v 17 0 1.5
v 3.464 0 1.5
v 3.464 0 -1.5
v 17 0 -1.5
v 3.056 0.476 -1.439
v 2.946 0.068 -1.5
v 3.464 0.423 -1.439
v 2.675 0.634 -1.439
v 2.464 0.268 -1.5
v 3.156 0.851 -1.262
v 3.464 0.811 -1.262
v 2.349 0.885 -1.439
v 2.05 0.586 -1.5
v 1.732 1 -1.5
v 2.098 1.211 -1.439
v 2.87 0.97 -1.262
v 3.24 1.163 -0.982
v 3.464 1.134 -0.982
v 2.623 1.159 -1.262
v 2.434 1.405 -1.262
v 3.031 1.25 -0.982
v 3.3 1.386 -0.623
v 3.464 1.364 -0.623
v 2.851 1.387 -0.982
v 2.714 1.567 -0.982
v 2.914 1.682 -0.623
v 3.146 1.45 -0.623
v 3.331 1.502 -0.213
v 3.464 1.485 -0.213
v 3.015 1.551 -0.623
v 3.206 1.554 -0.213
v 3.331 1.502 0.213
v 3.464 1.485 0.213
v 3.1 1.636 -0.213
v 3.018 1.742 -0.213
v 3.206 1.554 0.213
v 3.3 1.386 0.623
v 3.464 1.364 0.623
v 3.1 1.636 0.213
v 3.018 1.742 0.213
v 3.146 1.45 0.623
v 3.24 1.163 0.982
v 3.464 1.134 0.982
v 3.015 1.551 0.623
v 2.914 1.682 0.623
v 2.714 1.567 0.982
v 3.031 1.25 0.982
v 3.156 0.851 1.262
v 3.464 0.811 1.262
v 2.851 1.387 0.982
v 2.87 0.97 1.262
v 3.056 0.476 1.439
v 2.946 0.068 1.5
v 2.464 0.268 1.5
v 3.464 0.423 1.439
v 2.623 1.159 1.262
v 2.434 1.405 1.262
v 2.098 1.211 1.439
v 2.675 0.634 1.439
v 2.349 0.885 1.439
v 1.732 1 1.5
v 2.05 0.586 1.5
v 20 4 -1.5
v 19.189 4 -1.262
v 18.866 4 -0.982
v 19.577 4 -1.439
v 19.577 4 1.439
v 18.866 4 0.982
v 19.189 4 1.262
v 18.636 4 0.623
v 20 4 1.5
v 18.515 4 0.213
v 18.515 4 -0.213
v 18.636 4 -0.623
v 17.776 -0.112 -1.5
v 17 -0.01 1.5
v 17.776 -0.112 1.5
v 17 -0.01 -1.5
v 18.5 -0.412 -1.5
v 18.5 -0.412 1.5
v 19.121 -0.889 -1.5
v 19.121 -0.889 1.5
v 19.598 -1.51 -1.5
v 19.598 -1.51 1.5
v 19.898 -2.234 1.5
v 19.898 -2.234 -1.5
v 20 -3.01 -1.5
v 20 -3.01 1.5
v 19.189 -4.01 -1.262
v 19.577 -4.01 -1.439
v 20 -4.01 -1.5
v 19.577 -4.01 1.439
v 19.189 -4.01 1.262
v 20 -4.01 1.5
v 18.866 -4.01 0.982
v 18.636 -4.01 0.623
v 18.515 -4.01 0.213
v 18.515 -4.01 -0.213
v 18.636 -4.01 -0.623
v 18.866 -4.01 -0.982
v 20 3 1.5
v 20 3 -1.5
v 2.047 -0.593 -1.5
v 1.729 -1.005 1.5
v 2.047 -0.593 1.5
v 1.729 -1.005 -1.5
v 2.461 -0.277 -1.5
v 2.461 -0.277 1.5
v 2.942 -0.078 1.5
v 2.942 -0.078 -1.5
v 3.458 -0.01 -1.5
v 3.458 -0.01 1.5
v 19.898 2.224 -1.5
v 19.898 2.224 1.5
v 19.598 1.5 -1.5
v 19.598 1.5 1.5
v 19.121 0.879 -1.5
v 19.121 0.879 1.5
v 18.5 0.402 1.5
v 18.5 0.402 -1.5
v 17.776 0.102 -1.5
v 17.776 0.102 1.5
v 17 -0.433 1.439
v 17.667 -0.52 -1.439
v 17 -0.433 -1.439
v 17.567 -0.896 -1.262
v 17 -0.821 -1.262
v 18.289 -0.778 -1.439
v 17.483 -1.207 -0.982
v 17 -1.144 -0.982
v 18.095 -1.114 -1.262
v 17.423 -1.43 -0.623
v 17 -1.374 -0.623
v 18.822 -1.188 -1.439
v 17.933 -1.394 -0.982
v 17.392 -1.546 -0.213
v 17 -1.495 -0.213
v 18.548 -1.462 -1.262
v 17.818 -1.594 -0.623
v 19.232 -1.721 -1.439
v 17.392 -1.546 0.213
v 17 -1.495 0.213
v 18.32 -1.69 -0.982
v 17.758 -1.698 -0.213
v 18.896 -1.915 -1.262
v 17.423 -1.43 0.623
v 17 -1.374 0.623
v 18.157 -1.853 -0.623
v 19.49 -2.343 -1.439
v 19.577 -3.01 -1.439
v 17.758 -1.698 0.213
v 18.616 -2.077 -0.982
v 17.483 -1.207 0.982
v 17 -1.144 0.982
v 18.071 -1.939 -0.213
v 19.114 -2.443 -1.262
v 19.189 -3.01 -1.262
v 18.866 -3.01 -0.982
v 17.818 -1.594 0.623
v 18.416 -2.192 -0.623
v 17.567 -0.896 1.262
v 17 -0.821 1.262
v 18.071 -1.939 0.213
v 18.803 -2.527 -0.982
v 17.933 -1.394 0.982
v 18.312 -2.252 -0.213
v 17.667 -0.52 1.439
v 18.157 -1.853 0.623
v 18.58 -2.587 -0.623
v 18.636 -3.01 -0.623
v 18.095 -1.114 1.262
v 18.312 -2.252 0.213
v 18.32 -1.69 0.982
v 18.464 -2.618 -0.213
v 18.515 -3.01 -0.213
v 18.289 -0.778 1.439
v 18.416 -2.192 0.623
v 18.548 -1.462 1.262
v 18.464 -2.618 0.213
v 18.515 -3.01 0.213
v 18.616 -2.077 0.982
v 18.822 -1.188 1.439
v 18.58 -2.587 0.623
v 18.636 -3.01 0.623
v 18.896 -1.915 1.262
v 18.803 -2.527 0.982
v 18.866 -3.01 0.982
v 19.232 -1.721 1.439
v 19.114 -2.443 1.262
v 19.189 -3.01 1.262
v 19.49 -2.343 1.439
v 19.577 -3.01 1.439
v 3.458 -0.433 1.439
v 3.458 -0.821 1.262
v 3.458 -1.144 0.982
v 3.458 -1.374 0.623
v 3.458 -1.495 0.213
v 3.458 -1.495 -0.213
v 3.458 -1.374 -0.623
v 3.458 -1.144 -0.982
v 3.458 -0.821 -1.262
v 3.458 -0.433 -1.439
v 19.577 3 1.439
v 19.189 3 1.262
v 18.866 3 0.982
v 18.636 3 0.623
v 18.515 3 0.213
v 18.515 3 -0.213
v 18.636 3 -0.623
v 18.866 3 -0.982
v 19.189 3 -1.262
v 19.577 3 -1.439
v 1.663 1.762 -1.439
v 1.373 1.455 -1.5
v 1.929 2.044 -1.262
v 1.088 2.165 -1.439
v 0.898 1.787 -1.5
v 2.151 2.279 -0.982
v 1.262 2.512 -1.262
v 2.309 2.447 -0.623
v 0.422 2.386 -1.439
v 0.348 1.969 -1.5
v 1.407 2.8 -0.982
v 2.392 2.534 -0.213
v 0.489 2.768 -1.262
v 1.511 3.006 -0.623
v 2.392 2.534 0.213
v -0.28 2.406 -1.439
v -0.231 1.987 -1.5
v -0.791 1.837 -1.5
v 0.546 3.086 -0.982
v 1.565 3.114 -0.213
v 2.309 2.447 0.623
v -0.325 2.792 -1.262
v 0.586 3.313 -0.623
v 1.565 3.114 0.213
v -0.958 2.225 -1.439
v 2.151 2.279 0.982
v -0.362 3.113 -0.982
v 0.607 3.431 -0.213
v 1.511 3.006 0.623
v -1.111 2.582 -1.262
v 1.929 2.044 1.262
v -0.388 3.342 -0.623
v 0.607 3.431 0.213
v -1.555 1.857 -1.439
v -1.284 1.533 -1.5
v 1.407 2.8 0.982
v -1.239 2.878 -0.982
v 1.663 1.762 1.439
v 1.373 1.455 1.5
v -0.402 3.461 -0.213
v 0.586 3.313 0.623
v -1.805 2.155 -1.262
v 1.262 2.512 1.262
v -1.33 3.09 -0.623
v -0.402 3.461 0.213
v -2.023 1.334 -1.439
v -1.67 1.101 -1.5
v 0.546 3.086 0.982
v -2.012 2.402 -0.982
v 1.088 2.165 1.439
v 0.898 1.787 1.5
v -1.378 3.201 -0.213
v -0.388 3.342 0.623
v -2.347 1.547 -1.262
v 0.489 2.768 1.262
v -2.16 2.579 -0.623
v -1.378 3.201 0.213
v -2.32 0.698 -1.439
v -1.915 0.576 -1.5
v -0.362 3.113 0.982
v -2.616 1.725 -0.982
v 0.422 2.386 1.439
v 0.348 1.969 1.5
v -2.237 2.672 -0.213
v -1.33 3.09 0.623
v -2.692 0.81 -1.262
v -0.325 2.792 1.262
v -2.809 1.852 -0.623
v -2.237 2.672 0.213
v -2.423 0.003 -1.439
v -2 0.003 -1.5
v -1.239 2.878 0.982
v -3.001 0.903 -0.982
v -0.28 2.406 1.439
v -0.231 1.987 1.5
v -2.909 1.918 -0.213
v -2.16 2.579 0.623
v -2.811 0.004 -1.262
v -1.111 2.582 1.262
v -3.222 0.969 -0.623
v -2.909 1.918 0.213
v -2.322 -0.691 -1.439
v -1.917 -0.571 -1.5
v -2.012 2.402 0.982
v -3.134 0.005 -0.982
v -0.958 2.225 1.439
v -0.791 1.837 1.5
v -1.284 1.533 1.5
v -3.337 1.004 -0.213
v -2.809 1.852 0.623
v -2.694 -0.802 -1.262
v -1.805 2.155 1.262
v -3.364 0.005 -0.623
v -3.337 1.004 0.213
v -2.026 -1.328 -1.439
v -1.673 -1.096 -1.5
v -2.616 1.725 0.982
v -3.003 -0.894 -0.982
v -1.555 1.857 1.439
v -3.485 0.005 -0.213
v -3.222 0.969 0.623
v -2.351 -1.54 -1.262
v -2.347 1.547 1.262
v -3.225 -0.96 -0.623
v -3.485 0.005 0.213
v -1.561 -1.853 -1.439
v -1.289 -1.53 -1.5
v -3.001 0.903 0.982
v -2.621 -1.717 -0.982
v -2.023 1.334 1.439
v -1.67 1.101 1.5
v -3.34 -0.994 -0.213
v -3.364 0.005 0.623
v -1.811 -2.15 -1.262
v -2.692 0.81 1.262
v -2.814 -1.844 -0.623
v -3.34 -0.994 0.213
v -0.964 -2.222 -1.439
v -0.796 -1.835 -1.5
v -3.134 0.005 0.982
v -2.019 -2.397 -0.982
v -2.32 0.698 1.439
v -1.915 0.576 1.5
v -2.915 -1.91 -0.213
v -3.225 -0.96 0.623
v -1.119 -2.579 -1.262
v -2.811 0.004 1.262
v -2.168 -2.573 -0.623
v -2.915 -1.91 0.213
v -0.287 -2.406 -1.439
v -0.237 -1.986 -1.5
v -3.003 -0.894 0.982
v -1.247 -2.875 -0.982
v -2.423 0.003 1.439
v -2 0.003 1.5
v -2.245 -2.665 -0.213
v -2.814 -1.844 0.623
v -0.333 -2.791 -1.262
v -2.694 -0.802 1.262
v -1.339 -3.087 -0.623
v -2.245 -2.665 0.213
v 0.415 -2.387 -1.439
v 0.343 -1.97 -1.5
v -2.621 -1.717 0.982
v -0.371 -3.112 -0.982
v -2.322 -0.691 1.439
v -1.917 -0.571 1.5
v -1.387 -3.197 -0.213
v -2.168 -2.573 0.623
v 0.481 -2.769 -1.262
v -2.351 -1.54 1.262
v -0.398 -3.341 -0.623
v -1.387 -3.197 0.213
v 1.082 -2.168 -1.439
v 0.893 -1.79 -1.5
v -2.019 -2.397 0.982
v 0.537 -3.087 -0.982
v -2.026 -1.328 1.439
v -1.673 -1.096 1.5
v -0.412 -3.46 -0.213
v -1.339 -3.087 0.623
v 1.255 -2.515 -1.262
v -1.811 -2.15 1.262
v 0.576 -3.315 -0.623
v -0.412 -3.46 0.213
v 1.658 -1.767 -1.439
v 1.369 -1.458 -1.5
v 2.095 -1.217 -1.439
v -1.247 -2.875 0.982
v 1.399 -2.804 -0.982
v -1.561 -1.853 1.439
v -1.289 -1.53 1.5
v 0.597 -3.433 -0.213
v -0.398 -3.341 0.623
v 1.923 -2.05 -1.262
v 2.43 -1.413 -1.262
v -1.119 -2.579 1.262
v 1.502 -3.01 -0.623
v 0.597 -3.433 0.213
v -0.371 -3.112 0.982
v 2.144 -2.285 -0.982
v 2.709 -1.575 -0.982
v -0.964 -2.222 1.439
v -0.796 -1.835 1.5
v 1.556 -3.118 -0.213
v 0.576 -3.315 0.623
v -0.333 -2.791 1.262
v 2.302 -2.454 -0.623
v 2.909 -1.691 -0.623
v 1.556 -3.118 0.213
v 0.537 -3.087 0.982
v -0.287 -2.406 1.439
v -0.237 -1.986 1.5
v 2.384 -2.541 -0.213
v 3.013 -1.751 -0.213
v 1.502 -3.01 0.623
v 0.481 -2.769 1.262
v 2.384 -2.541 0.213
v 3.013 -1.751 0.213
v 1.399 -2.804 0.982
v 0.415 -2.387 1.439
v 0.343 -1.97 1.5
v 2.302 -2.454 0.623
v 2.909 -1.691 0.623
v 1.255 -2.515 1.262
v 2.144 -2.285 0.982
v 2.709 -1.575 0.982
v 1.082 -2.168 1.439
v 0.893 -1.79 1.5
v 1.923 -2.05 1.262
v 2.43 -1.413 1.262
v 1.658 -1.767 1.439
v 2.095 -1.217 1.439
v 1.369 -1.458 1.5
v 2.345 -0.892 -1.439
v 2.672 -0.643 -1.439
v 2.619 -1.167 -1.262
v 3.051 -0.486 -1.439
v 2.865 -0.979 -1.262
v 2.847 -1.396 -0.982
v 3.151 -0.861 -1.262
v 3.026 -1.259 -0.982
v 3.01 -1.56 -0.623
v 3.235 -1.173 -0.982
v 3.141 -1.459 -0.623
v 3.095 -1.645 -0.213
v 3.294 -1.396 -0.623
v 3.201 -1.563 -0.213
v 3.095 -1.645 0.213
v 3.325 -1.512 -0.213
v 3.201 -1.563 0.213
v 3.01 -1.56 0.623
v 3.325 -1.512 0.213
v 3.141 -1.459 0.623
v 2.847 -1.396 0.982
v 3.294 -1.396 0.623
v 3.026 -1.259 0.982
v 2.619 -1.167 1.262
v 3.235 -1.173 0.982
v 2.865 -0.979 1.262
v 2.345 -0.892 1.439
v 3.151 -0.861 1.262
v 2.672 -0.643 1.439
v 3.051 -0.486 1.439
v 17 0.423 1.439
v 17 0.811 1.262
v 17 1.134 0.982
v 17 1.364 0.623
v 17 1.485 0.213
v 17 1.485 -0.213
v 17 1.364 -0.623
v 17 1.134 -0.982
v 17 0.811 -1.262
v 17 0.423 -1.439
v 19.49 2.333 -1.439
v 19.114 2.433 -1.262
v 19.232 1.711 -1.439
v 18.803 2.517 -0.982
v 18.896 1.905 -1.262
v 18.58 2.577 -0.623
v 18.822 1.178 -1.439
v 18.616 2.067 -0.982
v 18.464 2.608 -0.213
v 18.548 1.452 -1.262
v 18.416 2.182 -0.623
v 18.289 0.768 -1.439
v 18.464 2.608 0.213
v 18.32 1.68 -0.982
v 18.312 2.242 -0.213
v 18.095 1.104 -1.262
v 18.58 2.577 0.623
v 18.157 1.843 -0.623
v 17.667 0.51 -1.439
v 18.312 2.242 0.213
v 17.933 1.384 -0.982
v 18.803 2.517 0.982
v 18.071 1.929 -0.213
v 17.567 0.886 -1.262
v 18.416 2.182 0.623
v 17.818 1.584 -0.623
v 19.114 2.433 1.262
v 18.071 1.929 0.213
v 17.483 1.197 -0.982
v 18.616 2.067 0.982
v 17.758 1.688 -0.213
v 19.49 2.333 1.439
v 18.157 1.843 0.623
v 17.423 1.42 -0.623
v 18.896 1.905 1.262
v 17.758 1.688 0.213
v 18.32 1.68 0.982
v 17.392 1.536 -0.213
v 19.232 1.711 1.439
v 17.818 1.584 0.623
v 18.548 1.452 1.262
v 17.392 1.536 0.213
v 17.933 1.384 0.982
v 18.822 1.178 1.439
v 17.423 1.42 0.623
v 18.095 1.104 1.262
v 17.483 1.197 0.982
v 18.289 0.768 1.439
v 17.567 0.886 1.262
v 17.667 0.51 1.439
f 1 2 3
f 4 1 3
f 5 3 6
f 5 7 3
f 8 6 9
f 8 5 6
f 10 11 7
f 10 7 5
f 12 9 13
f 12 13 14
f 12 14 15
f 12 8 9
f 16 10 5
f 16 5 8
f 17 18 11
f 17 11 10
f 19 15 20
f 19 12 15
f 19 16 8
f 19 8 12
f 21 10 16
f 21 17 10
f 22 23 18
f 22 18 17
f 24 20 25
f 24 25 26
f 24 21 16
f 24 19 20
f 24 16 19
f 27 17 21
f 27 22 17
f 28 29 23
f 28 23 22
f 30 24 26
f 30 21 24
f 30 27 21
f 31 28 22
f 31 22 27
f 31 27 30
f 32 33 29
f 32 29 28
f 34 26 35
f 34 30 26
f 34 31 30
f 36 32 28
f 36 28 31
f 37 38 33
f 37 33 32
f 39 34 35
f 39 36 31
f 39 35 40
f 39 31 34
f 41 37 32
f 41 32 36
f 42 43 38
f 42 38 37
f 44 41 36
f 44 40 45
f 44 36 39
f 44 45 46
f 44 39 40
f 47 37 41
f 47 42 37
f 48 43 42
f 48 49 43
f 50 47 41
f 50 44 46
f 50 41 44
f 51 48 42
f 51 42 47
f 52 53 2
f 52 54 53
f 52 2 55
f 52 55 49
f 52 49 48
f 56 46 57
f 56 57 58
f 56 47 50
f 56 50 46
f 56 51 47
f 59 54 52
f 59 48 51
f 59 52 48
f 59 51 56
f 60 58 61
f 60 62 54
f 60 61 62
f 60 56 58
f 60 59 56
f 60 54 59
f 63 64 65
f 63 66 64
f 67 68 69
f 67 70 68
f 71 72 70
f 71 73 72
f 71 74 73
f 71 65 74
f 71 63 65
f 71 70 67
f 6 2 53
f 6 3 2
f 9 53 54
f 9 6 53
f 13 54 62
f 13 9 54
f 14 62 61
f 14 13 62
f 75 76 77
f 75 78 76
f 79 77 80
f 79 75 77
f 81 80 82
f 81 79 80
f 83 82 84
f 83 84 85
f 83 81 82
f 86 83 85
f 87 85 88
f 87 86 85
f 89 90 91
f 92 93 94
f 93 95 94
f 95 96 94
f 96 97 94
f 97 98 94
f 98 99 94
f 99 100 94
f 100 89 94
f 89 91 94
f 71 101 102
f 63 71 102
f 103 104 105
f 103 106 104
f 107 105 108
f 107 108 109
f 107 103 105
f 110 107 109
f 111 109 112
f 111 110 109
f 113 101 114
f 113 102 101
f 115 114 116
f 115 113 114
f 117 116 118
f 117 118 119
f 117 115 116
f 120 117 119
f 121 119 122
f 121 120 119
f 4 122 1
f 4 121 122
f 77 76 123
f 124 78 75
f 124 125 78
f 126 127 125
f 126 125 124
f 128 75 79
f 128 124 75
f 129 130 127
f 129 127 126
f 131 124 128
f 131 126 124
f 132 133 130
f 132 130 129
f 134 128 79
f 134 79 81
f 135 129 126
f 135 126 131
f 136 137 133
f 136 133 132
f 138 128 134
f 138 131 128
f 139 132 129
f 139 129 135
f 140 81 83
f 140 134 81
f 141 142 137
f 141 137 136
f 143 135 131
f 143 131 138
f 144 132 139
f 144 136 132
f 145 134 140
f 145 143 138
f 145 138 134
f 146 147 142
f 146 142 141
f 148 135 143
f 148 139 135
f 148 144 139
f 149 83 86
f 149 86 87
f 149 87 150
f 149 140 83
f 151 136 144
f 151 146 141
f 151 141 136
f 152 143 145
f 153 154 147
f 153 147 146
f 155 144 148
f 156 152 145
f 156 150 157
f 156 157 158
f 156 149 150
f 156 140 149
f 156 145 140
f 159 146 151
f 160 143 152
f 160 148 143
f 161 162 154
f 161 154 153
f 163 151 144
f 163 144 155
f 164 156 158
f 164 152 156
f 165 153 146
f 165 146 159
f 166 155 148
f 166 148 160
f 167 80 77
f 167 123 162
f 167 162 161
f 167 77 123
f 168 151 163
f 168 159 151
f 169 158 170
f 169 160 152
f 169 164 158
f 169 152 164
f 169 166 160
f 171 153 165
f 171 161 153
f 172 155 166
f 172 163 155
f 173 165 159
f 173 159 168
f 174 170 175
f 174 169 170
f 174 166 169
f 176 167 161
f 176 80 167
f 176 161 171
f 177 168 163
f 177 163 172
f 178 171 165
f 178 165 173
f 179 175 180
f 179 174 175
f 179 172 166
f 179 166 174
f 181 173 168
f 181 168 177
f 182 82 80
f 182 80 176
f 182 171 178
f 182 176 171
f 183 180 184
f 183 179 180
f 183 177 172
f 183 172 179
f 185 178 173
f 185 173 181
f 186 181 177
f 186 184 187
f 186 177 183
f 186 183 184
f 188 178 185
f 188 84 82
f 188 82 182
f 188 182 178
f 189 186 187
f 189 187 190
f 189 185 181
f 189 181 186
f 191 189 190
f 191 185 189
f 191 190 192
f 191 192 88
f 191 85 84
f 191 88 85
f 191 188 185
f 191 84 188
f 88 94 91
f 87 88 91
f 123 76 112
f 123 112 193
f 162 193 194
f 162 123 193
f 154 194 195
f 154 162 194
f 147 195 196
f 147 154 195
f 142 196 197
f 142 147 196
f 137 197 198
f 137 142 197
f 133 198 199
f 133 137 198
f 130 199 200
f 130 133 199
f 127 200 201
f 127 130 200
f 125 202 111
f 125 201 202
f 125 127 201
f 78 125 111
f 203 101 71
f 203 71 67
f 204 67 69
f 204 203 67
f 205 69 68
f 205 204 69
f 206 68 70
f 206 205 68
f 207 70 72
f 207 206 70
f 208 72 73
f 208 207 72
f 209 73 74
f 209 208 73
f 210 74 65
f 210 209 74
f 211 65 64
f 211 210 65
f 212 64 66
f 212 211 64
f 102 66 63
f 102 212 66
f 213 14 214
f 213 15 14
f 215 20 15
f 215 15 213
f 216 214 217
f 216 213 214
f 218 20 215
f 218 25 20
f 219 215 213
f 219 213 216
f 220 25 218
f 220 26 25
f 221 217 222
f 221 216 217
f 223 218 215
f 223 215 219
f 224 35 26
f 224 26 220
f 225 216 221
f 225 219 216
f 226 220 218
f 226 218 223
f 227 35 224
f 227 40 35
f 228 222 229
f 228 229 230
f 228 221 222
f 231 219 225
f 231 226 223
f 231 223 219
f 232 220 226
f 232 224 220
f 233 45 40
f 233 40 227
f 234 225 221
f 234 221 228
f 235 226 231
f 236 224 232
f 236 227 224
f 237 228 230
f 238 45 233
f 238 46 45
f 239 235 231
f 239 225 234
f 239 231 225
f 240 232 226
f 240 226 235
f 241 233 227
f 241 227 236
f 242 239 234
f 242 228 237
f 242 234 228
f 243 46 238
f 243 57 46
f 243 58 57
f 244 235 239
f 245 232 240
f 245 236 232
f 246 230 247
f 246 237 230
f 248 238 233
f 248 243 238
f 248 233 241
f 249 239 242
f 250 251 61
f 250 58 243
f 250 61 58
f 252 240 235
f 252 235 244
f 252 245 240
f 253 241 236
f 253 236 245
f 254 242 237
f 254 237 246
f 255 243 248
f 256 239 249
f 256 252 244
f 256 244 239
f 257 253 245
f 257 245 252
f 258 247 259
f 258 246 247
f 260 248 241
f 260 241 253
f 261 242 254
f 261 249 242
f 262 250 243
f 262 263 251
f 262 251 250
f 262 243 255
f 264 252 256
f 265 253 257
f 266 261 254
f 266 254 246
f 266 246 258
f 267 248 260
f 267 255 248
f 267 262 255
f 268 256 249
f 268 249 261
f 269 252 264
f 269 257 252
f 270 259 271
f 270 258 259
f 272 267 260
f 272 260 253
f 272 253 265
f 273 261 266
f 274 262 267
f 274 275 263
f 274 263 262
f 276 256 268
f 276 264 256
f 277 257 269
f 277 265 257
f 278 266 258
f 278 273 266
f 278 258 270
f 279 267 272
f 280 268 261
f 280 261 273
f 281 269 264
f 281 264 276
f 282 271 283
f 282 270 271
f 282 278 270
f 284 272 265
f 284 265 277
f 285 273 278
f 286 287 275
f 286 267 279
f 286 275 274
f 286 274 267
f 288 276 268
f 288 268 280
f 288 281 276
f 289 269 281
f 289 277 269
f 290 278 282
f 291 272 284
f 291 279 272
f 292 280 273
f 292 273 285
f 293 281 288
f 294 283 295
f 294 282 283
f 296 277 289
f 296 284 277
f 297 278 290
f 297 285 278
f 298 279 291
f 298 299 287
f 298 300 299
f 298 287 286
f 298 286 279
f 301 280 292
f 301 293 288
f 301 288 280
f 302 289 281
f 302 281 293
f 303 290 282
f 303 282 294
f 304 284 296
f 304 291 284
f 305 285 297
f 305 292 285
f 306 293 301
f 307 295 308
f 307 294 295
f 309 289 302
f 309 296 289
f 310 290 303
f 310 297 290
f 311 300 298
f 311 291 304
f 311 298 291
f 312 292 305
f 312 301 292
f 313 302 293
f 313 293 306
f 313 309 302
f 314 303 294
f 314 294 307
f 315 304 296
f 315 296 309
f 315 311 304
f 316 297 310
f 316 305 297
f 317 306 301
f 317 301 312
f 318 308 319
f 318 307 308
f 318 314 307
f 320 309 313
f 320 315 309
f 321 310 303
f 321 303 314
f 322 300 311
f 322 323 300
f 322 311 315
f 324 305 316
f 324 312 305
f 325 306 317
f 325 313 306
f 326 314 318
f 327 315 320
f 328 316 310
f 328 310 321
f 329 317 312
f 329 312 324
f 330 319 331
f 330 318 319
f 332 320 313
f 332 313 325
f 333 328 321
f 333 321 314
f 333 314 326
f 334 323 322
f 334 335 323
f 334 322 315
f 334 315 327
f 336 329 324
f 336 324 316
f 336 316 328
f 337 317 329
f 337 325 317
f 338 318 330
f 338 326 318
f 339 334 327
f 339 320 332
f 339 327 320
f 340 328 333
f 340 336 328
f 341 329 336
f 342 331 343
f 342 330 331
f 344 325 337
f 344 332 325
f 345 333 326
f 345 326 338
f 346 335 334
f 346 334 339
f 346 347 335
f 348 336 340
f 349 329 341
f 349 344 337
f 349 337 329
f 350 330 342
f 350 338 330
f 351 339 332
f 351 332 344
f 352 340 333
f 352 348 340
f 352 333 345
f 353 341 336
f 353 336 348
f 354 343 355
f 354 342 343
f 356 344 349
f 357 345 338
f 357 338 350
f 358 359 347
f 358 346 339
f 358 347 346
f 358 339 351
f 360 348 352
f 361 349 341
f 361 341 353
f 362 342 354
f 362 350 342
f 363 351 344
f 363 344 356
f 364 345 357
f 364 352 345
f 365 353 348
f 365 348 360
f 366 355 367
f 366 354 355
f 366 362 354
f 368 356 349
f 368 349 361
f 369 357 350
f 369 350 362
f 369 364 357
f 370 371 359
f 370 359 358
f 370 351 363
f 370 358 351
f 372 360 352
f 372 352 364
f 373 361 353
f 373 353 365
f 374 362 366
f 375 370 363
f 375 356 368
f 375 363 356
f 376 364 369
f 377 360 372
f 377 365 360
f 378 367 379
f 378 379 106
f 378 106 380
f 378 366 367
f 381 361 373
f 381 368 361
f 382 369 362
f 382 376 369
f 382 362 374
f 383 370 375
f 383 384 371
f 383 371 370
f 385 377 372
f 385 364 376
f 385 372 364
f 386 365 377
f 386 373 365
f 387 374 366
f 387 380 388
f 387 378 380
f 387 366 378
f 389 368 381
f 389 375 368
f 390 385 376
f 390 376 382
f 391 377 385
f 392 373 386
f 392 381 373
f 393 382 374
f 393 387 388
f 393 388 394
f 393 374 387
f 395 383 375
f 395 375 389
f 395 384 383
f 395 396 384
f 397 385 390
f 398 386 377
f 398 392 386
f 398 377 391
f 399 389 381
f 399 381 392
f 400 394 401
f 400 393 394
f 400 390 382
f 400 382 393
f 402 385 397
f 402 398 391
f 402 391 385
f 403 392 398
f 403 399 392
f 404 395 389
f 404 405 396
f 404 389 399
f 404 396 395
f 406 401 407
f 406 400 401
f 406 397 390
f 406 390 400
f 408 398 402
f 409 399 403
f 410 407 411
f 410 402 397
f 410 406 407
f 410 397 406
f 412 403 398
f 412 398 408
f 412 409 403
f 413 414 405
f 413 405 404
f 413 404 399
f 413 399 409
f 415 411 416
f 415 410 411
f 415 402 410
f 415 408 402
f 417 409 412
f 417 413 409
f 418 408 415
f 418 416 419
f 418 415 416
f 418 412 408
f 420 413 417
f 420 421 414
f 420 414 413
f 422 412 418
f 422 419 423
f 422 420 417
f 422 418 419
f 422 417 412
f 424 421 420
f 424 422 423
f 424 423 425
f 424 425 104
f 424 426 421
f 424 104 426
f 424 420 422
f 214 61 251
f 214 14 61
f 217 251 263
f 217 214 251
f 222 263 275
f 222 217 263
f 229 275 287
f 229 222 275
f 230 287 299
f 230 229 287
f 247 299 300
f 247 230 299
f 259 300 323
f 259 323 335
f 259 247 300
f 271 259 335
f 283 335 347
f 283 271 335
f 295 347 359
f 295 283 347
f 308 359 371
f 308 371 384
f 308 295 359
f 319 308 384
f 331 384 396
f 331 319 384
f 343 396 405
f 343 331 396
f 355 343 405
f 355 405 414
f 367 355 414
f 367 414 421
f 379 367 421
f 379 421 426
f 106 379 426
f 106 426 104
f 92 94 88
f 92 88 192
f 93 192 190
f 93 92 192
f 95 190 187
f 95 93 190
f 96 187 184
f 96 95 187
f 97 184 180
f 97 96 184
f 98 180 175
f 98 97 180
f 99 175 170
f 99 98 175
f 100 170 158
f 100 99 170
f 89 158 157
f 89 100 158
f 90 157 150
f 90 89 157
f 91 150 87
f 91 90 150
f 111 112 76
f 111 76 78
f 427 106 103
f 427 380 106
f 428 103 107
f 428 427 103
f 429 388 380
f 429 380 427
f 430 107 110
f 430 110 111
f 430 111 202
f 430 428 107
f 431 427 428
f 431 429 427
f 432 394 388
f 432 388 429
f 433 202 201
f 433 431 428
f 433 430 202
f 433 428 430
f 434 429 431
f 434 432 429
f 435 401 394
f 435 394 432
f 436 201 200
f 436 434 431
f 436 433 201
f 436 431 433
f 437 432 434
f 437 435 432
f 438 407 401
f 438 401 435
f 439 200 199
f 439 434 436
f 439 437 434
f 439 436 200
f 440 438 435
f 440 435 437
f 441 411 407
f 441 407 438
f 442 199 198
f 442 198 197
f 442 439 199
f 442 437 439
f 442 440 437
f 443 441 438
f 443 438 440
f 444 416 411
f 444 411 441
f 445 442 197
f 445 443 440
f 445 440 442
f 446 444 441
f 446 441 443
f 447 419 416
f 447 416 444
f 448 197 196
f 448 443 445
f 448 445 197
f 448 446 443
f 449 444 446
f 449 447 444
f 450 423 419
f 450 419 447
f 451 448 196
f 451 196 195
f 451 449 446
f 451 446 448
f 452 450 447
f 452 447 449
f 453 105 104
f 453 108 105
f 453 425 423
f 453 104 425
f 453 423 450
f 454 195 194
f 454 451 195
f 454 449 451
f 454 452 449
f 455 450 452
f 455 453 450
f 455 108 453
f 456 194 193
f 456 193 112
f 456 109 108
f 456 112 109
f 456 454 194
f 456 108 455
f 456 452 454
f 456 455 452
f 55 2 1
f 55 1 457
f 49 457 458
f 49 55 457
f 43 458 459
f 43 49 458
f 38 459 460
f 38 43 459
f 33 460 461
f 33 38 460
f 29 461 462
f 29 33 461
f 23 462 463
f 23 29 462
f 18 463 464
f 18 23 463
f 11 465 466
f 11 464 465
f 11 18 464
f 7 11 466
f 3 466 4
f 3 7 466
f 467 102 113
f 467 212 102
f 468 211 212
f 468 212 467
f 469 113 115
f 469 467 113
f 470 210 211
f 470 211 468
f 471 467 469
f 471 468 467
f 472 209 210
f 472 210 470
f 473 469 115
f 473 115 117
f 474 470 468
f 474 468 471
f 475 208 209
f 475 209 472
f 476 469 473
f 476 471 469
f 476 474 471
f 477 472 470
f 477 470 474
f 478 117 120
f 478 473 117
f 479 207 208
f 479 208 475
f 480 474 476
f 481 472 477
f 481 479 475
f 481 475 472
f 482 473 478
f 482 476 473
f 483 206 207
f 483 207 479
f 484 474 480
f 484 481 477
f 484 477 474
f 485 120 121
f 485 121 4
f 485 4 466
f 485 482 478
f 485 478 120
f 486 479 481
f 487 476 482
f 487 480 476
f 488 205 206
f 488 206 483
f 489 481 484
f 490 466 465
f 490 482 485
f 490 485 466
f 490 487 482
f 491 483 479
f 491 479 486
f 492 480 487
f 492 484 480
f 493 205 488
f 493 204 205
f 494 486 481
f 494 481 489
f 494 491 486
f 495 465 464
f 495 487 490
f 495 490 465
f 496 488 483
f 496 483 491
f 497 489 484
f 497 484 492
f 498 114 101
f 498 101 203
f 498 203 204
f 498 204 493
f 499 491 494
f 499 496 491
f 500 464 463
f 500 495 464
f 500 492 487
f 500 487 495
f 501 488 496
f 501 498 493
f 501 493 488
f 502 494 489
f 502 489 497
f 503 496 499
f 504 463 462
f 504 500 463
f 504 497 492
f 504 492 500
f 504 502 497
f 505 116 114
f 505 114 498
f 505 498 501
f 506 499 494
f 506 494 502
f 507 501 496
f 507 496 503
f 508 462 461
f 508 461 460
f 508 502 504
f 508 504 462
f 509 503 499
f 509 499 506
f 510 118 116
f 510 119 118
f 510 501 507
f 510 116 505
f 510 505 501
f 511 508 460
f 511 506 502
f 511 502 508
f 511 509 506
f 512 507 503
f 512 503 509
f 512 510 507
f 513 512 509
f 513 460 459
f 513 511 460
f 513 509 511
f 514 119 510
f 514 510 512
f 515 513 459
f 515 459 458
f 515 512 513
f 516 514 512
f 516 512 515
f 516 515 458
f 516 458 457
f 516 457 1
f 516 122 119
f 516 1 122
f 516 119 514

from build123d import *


with BuildPart() as part:
    # Sweep1: sweep along a path in Sketch1
    with BuildLine(Plane.XY) as sweep1_path:
        Line((20, 4), (20, 3))
        ThreePointArc((20, 3), (19.121320344, 0.878679656), (17, 0))
        Line((17, 0), (3.464101615, 0))
        ThreePointArc((3.464101615, 0), (2.464101615, 0.267949192), (1.732050808, 1))
        ThreePointArc((1.732050808, 1), (-1.999997913, 0.002889164), (1.729154418, -1.005))
        ThreePointArc((1.729154418, -1.005), (2.460811968, -0.276506418), (3.458308835, -0.01))
        Line((3.458308835, -0.01), (17, -0.01))
        ThreePointArc((17, -0.01), (19.121320344, -0.888679656), (20, -3.01))
        Line((20, -3.01), (20, -4.01))
    # Sketch3 → Sweep1 (sweep)
    with BuildSketch(Plane(origin=(20, 4, 0), x_dir=(1, 0, 0), z_dir=(0, 1, 0))):
        with BuildLine():
            Line((0, 1.5), (0, -1.5))
            ThreePointArc((0, -1.5), (-1.5, 0), (0, 1.5))
        make_face()
    sweep(path=sweep1_path.line)


solid = part.part
